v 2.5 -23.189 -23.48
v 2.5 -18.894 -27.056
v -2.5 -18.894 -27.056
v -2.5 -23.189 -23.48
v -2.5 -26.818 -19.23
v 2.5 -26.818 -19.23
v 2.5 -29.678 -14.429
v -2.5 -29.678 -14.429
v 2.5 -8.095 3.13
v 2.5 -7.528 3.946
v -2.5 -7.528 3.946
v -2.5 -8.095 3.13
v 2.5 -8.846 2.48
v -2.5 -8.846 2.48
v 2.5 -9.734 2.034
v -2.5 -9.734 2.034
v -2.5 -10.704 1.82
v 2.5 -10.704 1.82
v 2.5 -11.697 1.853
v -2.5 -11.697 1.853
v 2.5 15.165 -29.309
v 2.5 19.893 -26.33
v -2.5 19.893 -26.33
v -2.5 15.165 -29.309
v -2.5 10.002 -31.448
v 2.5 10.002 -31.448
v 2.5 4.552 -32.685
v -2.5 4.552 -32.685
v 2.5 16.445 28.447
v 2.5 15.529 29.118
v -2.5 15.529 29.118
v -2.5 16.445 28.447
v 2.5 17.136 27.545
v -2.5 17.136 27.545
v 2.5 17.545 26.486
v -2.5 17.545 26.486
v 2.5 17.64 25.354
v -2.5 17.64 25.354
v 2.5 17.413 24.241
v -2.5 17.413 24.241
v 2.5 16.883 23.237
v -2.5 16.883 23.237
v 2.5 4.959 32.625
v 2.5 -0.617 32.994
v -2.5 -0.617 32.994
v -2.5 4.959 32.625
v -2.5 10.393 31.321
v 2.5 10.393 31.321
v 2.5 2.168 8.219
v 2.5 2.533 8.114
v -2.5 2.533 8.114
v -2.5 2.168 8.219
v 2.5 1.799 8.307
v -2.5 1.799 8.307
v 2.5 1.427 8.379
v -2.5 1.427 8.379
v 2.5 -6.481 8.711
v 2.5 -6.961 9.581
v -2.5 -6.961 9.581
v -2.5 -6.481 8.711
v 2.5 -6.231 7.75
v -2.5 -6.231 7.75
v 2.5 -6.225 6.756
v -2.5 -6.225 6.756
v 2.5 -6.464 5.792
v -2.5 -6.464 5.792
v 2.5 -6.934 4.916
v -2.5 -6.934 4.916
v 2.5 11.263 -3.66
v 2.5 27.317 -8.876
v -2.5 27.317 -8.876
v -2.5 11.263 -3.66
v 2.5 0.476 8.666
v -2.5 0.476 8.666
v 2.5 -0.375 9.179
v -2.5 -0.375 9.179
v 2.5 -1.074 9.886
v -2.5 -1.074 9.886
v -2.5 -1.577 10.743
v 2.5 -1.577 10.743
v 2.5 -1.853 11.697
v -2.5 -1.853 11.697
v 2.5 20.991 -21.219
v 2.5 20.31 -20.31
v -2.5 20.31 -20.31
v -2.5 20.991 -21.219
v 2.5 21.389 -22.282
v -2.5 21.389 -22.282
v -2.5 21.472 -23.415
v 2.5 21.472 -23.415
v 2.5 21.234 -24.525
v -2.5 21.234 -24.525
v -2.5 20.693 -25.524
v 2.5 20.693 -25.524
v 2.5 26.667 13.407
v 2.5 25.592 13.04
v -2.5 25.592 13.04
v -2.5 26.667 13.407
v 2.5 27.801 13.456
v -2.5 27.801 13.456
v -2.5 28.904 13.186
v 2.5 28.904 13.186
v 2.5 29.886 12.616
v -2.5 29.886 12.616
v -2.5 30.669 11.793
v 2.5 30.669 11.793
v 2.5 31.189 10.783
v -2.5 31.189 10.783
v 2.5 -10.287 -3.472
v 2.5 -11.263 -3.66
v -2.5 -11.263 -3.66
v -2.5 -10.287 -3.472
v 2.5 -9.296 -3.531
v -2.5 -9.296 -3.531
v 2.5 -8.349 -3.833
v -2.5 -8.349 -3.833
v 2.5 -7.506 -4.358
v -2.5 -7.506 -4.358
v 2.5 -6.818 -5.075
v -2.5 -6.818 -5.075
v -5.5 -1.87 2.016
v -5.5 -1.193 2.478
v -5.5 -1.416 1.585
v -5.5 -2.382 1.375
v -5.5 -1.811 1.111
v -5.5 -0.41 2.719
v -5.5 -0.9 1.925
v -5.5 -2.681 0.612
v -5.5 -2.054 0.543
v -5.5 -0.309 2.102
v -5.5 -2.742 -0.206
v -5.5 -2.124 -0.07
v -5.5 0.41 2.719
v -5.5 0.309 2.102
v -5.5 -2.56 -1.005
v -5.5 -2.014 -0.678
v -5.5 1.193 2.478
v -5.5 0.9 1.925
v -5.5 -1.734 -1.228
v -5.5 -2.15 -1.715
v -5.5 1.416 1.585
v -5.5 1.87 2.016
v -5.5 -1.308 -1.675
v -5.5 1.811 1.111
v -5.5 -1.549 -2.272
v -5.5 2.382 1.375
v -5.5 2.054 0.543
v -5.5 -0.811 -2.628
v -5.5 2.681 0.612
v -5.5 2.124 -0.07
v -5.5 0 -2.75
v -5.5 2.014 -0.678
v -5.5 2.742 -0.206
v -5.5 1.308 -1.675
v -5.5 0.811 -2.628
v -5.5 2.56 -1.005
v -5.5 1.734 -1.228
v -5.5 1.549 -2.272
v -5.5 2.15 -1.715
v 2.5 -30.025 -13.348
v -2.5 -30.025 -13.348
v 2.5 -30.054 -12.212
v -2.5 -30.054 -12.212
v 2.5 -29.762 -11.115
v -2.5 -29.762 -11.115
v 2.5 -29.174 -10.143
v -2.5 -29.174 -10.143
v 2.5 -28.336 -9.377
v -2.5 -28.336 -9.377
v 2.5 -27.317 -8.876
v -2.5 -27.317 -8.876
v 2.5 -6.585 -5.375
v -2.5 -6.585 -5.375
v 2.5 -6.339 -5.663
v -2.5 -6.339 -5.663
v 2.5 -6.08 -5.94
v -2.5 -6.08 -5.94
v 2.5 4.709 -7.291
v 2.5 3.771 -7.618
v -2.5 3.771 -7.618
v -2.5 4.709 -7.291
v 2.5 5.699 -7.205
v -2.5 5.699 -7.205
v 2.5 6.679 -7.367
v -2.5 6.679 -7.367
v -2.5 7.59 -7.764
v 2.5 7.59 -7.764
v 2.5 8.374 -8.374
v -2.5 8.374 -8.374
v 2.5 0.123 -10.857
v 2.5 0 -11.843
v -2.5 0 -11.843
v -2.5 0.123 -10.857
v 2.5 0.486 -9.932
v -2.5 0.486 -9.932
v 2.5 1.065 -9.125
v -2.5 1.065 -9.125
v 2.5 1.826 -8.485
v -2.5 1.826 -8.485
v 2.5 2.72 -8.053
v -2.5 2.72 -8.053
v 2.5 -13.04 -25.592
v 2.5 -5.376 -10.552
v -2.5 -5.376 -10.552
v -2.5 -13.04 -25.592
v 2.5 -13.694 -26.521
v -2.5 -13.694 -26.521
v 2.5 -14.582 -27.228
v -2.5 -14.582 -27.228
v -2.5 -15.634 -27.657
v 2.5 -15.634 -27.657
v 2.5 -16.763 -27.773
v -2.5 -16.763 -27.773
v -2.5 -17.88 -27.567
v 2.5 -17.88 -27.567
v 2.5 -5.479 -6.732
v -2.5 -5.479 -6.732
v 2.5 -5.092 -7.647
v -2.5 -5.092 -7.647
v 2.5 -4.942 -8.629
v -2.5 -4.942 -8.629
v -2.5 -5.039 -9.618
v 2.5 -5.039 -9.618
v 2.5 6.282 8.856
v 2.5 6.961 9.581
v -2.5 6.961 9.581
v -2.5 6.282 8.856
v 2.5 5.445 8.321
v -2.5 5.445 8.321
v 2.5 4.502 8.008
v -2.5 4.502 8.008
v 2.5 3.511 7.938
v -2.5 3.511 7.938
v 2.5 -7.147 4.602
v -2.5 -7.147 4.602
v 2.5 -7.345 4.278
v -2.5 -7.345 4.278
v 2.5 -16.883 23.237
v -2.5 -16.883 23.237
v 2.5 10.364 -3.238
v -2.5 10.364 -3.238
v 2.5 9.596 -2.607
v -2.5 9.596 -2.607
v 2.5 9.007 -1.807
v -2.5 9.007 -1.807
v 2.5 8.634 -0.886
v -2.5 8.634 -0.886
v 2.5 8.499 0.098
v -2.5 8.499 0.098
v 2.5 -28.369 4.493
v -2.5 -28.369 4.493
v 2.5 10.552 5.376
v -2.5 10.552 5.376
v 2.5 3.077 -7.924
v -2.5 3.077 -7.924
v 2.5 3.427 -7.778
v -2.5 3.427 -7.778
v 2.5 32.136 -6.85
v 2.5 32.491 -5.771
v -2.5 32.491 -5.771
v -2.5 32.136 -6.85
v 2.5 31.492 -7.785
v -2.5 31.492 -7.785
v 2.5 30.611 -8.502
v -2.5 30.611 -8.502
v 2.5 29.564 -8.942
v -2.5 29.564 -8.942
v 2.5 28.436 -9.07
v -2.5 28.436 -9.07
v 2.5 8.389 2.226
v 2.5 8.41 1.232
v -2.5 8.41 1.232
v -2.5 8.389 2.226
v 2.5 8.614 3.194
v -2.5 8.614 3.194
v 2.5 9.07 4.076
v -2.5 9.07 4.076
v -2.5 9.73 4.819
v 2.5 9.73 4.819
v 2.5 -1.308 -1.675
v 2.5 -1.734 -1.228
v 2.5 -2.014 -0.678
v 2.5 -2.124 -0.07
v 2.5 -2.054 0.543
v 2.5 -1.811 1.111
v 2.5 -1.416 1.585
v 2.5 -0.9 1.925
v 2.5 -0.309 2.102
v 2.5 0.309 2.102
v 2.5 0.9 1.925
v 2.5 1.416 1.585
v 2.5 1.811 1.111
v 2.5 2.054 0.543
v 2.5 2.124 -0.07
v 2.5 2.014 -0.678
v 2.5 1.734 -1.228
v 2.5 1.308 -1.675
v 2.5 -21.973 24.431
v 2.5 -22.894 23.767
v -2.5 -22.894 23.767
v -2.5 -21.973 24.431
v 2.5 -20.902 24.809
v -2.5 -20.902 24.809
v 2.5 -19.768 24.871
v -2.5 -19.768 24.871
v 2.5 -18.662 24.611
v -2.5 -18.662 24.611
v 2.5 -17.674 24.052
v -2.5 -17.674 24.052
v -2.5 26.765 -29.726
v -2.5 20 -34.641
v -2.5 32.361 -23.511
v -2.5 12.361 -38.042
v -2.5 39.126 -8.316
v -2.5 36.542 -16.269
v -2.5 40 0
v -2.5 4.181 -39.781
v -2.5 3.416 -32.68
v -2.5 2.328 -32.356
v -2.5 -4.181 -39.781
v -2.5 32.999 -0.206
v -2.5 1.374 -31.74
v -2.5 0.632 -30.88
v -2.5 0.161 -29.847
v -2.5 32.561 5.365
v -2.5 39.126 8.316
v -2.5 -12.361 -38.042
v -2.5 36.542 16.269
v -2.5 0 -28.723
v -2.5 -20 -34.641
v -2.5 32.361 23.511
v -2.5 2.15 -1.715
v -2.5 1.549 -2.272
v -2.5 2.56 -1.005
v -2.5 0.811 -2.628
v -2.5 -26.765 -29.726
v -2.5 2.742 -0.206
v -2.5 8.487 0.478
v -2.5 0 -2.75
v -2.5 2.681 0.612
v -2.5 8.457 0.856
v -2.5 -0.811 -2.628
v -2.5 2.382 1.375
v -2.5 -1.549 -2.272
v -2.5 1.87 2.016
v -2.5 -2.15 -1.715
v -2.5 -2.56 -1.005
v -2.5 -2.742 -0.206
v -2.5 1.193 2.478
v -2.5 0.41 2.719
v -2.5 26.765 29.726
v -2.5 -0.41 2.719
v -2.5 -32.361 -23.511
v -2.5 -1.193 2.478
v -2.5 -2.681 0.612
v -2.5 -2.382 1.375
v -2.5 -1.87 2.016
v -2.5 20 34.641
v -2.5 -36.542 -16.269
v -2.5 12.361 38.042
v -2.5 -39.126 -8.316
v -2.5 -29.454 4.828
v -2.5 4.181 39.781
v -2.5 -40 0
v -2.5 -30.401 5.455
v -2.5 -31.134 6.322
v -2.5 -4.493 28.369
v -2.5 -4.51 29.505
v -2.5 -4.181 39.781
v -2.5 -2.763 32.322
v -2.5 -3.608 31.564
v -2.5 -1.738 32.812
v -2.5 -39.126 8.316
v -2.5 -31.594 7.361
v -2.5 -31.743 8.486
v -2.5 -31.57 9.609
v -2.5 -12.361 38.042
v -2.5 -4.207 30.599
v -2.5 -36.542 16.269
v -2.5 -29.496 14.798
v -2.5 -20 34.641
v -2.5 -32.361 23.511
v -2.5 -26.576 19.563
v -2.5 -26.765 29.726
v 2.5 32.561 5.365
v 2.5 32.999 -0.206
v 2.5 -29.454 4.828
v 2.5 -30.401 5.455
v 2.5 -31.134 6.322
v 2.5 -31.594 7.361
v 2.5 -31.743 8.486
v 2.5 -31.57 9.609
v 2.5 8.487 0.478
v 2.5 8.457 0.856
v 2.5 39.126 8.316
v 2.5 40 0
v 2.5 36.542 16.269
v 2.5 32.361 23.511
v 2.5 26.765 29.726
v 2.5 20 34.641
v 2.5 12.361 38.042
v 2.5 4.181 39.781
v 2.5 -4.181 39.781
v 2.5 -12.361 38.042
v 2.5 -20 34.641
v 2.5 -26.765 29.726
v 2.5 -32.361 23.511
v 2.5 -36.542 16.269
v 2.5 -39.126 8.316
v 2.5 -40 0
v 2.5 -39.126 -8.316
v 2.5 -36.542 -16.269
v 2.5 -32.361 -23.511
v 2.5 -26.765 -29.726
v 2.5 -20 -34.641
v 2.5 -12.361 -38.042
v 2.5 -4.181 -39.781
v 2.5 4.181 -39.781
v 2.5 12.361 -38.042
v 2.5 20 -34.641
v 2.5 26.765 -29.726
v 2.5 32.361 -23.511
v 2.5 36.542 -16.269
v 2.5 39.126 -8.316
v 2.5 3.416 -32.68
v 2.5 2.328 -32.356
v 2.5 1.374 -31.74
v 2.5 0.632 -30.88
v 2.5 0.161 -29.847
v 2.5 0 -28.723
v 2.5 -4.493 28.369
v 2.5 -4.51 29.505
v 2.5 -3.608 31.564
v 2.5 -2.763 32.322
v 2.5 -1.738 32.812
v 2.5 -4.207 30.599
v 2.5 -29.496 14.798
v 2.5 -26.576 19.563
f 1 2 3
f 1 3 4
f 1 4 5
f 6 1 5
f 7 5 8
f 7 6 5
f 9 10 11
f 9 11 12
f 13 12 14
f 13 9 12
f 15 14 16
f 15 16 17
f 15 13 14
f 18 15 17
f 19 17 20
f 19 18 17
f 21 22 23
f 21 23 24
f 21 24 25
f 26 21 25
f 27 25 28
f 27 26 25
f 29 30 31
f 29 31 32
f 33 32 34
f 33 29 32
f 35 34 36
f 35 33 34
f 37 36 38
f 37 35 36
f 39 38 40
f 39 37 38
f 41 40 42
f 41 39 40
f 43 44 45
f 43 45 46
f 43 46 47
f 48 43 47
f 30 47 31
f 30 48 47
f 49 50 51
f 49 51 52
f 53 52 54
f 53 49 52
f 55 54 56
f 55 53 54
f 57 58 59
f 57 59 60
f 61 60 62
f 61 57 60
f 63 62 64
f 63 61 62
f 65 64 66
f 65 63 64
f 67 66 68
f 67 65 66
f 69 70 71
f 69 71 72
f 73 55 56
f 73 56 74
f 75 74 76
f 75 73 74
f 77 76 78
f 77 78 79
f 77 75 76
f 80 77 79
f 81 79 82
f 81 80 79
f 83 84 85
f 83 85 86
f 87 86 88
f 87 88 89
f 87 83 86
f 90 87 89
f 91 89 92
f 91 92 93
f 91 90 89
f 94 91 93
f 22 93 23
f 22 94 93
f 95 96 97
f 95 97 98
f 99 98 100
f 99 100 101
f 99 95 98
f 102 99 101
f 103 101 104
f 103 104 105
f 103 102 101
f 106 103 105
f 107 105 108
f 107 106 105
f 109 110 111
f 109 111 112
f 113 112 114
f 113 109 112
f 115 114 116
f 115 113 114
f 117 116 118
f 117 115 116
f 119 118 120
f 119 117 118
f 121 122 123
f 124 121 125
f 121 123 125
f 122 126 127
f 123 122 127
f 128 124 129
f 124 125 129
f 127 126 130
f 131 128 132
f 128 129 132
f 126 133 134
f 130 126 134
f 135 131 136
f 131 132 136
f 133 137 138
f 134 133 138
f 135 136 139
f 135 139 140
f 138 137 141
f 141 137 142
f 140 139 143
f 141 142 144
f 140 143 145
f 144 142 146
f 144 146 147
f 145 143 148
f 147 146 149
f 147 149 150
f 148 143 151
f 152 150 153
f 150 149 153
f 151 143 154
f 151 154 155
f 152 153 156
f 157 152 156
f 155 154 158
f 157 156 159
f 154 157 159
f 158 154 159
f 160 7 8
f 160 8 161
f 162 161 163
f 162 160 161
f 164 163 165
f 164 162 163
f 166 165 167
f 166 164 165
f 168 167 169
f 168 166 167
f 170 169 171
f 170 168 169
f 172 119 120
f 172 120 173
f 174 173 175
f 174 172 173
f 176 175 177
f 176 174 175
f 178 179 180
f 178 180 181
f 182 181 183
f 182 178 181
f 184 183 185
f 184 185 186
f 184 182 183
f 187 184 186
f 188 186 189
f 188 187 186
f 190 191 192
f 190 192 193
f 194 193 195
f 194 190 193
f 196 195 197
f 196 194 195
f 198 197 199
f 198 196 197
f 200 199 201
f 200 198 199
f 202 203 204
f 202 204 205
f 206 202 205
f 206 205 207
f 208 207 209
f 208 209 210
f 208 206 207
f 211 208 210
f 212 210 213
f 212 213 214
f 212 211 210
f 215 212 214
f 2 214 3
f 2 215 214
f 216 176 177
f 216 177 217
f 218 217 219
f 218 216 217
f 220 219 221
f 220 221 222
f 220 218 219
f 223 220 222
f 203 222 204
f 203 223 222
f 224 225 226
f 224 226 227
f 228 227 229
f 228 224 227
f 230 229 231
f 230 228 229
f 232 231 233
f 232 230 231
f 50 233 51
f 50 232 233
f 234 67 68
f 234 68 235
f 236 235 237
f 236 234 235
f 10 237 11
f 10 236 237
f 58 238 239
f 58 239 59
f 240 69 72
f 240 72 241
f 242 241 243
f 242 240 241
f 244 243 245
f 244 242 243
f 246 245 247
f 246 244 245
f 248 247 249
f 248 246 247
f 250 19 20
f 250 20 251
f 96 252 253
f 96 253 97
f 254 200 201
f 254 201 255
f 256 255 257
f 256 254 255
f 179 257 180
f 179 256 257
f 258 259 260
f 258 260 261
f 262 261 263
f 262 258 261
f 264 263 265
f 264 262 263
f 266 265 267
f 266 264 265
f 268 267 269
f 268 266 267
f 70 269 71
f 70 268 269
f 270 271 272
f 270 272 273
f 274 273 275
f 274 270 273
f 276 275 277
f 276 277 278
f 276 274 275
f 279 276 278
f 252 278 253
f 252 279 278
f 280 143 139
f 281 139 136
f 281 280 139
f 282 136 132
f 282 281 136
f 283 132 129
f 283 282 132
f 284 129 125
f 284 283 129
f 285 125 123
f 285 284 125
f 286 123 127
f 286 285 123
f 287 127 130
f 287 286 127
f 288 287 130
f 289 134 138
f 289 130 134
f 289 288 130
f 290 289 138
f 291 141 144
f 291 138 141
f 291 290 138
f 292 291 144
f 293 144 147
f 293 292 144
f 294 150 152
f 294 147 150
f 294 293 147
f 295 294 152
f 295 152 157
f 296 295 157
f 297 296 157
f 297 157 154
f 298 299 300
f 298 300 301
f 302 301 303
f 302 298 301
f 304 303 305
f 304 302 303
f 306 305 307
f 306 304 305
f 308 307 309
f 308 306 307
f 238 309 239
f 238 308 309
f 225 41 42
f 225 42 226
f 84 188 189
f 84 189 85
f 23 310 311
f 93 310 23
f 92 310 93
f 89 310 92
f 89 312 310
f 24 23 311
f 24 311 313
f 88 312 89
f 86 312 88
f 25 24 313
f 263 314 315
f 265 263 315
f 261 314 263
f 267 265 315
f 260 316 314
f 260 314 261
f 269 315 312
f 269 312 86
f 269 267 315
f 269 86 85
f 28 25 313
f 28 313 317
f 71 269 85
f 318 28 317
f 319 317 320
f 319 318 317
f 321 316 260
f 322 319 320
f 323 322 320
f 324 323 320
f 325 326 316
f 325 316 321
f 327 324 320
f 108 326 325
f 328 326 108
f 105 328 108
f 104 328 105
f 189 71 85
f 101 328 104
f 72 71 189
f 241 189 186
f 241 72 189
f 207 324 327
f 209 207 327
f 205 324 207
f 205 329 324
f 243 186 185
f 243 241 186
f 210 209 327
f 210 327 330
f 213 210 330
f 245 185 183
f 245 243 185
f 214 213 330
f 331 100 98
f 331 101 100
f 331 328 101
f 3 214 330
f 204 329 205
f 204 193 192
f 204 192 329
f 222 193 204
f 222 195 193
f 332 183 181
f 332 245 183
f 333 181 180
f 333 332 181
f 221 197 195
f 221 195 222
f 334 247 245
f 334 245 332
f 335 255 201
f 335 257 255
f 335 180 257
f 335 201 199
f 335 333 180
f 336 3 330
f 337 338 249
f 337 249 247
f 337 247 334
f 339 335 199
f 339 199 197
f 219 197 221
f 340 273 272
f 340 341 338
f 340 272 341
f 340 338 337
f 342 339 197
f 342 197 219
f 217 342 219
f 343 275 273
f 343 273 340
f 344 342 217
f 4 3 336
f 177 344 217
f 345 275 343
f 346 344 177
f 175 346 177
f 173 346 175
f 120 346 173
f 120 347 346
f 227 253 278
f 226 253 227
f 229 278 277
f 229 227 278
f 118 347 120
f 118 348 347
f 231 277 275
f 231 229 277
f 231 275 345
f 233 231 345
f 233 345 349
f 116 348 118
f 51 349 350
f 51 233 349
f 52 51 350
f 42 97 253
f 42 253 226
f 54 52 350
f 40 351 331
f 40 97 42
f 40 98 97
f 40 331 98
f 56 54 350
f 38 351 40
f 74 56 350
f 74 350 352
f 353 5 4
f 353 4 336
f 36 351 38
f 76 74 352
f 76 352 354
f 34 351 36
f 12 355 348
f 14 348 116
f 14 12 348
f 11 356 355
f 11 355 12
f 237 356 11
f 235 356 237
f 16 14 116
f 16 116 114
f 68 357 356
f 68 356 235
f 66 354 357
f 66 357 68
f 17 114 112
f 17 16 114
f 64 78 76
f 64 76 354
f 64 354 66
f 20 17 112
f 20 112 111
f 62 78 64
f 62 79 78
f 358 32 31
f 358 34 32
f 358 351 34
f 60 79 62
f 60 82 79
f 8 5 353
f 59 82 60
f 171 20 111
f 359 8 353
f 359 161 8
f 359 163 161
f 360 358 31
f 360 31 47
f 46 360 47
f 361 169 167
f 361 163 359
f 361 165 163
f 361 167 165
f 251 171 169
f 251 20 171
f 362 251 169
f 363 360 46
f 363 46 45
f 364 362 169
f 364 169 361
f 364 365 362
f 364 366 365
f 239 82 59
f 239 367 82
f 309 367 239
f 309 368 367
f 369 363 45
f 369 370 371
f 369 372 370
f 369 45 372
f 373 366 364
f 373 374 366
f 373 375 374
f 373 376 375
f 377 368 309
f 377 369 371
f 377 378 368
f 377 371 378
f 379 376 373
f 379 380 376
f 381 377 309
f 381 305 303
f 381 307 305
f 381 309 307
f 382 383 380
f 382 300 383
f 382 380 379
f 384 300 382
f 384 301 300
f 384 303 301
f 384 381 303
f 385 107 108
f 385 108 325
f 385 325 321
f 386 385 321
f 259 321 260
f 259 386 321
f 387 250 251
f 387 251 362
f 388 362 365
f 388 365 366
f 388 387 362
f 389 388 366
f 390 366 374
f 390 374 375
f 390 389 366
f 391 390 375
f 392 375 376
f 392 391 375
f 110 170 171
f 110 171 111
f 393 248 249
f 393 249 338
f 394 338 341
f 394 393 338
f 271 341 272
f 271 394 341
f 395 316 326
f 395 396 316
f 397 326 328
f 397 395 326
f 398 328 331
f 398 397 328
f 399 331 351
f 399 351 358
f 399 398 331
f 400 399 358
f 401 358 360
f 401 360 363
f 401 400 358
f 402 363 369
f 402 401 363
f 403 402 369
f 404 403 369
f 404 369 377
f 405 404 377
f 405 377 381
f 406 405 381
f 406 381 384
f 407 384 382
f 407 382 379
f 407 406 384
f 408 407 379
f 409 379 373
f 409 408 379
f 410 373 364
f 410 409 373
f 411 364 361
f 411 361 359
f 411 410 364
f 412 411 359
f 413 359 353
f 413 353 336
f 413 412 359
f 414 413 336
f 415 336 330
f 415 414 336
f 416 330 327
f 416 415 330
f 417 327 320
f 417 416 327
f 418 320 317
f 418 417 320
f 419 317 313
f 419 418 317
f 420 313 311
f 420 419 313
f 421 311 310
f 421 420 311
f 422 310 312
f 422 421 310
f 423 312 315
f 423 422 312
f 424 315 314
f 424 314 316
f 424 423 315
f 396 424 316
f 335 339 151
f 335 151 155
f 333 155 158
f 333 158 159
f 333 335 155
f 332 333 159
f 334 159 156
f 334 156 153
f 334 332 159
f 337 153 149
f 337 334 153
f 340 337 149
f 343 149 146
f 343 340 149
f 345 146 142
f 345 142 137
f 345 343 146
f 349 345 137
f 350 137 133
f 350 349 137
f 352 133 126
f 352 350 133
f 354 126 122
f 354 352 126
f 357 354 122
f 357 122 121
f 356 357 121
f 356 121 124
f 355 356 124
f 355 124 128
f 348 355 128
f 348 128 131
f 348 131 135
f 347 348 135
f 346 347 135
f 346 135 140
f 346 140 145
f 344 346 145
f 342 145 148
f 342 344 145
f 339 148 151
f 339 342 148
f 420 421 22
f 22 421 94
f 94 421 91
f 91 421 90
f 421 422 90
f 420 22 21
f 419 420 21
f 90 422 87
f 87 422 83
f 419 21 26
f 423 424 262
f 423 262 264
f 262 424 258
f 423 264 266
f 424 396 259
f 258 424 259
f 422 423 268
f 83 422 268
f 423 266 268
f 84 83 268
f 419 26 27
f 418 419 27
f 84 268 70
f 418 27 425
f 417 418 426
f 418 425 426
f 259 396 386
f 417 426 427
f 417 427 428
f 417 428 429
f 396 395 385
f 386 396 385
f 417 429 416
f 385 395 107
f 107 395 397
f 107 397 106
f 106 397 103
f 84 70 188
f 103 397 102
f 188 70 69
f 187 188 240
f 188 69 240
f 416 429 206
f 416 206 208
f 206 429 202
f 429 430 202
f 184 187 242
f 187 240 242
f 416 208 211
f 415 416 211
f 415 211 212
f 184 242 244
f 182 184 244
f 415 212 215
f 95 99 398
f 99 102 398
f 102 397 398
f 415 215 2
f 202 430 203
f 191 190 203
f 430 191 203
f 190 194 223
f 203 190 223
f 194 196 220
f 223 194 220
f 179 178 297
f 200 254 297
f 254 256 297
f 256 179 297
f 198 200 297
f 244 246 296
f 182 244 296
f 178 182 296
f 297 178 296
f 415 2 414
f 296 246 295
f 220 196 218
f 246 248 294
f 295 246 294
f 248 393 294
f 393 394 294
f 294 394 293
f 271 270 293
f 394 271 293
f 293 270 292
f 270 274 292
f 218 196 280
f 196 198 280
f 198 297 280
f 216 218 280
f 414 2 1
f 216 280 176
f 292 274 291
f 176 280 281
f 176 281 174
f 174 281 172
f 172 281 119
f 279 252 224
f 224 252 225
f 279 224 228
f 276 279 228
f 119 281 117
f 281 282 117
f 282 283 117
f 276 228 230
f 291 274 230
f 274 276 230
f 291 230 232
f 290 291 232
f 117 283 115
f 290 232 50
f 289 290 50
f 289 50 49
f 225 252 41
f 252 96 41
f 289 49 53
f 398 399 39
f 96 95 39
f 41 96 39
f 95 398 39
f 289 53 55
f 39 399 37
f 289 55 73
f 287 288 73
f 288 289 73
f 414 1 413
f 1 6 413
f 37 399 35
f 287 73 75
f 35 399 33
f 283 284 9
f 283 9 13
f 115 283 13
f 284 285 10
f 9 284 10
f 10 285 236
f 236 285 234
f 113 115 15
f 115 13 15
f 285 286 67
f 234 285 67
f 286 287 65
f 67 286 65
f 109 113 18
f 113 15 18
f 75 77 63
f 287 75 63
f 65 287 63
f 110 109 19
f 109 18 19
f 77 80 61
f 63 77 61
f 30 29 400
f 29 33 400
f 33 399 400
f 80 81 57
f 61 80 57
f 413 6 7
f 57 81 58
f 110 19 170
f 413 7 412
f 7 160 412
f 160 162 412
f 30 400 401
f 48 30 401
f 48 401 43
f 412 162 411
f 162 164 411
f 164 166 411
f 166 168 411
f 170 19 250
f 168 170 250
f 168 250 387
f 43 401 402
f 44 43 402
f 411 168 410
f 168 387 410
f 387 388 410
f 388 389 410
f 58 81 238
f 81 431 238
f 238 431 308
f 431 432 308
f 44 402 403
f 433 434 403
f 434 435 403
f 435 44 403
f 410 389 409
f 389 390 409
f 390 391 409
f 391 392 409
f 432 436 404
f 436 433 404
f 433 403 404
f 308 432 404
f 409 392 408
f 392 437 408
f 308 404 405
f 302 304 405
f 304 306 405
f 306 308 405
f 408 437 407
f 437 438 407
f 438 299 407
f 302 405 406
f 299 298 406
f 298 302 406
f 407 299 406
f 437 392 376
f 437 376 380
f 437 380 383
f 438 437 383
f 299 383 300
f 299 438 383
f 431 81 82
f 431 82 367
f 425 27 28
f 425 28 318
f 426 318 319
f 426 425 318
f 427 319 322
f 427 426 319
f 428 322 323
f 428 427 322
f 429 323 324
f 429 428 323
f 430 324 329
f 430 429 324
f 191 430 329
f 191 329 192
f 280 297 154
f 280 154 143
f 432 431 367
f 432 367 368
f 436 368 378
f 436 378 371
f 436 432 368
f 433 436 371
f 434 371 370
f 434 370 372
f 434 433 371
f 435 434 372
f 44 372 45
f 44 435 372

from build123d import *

# Parameters (mm, degrees)
SKETCH3_W           = 5
SKETCH3_H           = 40
CUT_EXTRUDE1_DEPTH  = 5
CIRPATTERN1_COUNT   = 5
SKETCH8_R           = 2.75
BOSS_EXTRUDE1_DEPTH = 3
CUT_EXTRUDE2_REACH  = 10


with BuildPart() as part:
    # Sketch3 → Shape_Roue (revolve)
    with BuildSketch(Plane.XY):
        with Locations((0, 20)):
            Rectangle(SKETCH3_W, SKETCH3_H)
    revolve(axis=Axis((-2.5, 0, 0), (1, 0, 0)))

    # Sketch6 → Cut-Extrude1 (cut)
    with BuildSketch(Plane(origin=(2.5, 0, 0), x_dir=(0, 0, -1), z_dir=(1, 0, 0))):
        with BuildLine():
            Line((8.374067112, 8.374067112), (20.310096012, 20.310096012))
            ThreePointArc((20.310096012, 20.310096012), (23.415046761, 21.472099275), (26.330043569, 19.892933561))
            ThreePointArc((26.330043569, 19.892933561), (30.488024573, 12.628553268), (32.684580575, 4.551724138))
            ThreePointArc((32.684580575, 4.551724138), (31.740005351, 1.373871343), (28.722813233, 0))
            Line((28.722813233, 0), (11.842719282, 0))
            ThreePointArc((11.842719282, 0), (9.510338524, 0.750384638), (8.053049112, 2.72))
            ThreePointArc((8.053049112, 2.72), (7.852976026, 3.252809175), (7.617696081, 3.771035191))
            ThreePointArc((7.617696081, 3.771035191), (7.255426928, 6.194222796), (8.374067112, 8.374067112))
        make_face()
    cut_extrude1 = extrude(amount=-CUT_EXTRUDE1_DEPTH, mode=Mode.SUBTRACT)

    # CirPattern1: Cut-Extrude1 ×5 about axis
    cirpattern1_axis = Axis((0, 0, 0), (1, 0, 0))
    for i in range(1, CIRPATTERN1_COUNT):
        add(cut_extrude1.rotate(cirpattern1_axis, i * 360 / CIRPATTERN1_COUNT), mode=Mode.SUBTRACT)

    # Sketch8 → Boss-Extrude1 (add)
    with BuildSketch(Plane(origin=(-2.5, 0, 0), x_dir=(0, 0, -1), z_dir=(1, 0, 0))):
        Circle(SKETCH8_R)
    extrude(amount=-BOSS_EXTRUDE1_DEPTH)

    # Sketch7 → Cut-Extrude2 (cut, up to next)
    with BuildSketch(Plane(origin=(2.5, 0, 0), x_dir=(0, 0, -1), z_dir=(1, 0, 0)), mode=Mode.PRIVATE) as cut_extrude2_sk1:
        with BuildLine():
            Line((1.675, 1.307669683), (1.675, -1.307669683))
            ThreePointArc((1.675, -1.307669683), (-2.125, 0), (1.675, 1.307669683))
        make_face()
    cut_extrude2_tool1 = extrude(cut_extrude2_sk1.sketch, amount=-CUT_EXTRUDE2_REACH, mode=Mode.PRIVATE) & part.part
    add(cut_extrude2_tool1.solids().sort_by_distance((2.5, 0, 0.111388))[0], mode=Mode.SUBTRACT)


solid = part.part
